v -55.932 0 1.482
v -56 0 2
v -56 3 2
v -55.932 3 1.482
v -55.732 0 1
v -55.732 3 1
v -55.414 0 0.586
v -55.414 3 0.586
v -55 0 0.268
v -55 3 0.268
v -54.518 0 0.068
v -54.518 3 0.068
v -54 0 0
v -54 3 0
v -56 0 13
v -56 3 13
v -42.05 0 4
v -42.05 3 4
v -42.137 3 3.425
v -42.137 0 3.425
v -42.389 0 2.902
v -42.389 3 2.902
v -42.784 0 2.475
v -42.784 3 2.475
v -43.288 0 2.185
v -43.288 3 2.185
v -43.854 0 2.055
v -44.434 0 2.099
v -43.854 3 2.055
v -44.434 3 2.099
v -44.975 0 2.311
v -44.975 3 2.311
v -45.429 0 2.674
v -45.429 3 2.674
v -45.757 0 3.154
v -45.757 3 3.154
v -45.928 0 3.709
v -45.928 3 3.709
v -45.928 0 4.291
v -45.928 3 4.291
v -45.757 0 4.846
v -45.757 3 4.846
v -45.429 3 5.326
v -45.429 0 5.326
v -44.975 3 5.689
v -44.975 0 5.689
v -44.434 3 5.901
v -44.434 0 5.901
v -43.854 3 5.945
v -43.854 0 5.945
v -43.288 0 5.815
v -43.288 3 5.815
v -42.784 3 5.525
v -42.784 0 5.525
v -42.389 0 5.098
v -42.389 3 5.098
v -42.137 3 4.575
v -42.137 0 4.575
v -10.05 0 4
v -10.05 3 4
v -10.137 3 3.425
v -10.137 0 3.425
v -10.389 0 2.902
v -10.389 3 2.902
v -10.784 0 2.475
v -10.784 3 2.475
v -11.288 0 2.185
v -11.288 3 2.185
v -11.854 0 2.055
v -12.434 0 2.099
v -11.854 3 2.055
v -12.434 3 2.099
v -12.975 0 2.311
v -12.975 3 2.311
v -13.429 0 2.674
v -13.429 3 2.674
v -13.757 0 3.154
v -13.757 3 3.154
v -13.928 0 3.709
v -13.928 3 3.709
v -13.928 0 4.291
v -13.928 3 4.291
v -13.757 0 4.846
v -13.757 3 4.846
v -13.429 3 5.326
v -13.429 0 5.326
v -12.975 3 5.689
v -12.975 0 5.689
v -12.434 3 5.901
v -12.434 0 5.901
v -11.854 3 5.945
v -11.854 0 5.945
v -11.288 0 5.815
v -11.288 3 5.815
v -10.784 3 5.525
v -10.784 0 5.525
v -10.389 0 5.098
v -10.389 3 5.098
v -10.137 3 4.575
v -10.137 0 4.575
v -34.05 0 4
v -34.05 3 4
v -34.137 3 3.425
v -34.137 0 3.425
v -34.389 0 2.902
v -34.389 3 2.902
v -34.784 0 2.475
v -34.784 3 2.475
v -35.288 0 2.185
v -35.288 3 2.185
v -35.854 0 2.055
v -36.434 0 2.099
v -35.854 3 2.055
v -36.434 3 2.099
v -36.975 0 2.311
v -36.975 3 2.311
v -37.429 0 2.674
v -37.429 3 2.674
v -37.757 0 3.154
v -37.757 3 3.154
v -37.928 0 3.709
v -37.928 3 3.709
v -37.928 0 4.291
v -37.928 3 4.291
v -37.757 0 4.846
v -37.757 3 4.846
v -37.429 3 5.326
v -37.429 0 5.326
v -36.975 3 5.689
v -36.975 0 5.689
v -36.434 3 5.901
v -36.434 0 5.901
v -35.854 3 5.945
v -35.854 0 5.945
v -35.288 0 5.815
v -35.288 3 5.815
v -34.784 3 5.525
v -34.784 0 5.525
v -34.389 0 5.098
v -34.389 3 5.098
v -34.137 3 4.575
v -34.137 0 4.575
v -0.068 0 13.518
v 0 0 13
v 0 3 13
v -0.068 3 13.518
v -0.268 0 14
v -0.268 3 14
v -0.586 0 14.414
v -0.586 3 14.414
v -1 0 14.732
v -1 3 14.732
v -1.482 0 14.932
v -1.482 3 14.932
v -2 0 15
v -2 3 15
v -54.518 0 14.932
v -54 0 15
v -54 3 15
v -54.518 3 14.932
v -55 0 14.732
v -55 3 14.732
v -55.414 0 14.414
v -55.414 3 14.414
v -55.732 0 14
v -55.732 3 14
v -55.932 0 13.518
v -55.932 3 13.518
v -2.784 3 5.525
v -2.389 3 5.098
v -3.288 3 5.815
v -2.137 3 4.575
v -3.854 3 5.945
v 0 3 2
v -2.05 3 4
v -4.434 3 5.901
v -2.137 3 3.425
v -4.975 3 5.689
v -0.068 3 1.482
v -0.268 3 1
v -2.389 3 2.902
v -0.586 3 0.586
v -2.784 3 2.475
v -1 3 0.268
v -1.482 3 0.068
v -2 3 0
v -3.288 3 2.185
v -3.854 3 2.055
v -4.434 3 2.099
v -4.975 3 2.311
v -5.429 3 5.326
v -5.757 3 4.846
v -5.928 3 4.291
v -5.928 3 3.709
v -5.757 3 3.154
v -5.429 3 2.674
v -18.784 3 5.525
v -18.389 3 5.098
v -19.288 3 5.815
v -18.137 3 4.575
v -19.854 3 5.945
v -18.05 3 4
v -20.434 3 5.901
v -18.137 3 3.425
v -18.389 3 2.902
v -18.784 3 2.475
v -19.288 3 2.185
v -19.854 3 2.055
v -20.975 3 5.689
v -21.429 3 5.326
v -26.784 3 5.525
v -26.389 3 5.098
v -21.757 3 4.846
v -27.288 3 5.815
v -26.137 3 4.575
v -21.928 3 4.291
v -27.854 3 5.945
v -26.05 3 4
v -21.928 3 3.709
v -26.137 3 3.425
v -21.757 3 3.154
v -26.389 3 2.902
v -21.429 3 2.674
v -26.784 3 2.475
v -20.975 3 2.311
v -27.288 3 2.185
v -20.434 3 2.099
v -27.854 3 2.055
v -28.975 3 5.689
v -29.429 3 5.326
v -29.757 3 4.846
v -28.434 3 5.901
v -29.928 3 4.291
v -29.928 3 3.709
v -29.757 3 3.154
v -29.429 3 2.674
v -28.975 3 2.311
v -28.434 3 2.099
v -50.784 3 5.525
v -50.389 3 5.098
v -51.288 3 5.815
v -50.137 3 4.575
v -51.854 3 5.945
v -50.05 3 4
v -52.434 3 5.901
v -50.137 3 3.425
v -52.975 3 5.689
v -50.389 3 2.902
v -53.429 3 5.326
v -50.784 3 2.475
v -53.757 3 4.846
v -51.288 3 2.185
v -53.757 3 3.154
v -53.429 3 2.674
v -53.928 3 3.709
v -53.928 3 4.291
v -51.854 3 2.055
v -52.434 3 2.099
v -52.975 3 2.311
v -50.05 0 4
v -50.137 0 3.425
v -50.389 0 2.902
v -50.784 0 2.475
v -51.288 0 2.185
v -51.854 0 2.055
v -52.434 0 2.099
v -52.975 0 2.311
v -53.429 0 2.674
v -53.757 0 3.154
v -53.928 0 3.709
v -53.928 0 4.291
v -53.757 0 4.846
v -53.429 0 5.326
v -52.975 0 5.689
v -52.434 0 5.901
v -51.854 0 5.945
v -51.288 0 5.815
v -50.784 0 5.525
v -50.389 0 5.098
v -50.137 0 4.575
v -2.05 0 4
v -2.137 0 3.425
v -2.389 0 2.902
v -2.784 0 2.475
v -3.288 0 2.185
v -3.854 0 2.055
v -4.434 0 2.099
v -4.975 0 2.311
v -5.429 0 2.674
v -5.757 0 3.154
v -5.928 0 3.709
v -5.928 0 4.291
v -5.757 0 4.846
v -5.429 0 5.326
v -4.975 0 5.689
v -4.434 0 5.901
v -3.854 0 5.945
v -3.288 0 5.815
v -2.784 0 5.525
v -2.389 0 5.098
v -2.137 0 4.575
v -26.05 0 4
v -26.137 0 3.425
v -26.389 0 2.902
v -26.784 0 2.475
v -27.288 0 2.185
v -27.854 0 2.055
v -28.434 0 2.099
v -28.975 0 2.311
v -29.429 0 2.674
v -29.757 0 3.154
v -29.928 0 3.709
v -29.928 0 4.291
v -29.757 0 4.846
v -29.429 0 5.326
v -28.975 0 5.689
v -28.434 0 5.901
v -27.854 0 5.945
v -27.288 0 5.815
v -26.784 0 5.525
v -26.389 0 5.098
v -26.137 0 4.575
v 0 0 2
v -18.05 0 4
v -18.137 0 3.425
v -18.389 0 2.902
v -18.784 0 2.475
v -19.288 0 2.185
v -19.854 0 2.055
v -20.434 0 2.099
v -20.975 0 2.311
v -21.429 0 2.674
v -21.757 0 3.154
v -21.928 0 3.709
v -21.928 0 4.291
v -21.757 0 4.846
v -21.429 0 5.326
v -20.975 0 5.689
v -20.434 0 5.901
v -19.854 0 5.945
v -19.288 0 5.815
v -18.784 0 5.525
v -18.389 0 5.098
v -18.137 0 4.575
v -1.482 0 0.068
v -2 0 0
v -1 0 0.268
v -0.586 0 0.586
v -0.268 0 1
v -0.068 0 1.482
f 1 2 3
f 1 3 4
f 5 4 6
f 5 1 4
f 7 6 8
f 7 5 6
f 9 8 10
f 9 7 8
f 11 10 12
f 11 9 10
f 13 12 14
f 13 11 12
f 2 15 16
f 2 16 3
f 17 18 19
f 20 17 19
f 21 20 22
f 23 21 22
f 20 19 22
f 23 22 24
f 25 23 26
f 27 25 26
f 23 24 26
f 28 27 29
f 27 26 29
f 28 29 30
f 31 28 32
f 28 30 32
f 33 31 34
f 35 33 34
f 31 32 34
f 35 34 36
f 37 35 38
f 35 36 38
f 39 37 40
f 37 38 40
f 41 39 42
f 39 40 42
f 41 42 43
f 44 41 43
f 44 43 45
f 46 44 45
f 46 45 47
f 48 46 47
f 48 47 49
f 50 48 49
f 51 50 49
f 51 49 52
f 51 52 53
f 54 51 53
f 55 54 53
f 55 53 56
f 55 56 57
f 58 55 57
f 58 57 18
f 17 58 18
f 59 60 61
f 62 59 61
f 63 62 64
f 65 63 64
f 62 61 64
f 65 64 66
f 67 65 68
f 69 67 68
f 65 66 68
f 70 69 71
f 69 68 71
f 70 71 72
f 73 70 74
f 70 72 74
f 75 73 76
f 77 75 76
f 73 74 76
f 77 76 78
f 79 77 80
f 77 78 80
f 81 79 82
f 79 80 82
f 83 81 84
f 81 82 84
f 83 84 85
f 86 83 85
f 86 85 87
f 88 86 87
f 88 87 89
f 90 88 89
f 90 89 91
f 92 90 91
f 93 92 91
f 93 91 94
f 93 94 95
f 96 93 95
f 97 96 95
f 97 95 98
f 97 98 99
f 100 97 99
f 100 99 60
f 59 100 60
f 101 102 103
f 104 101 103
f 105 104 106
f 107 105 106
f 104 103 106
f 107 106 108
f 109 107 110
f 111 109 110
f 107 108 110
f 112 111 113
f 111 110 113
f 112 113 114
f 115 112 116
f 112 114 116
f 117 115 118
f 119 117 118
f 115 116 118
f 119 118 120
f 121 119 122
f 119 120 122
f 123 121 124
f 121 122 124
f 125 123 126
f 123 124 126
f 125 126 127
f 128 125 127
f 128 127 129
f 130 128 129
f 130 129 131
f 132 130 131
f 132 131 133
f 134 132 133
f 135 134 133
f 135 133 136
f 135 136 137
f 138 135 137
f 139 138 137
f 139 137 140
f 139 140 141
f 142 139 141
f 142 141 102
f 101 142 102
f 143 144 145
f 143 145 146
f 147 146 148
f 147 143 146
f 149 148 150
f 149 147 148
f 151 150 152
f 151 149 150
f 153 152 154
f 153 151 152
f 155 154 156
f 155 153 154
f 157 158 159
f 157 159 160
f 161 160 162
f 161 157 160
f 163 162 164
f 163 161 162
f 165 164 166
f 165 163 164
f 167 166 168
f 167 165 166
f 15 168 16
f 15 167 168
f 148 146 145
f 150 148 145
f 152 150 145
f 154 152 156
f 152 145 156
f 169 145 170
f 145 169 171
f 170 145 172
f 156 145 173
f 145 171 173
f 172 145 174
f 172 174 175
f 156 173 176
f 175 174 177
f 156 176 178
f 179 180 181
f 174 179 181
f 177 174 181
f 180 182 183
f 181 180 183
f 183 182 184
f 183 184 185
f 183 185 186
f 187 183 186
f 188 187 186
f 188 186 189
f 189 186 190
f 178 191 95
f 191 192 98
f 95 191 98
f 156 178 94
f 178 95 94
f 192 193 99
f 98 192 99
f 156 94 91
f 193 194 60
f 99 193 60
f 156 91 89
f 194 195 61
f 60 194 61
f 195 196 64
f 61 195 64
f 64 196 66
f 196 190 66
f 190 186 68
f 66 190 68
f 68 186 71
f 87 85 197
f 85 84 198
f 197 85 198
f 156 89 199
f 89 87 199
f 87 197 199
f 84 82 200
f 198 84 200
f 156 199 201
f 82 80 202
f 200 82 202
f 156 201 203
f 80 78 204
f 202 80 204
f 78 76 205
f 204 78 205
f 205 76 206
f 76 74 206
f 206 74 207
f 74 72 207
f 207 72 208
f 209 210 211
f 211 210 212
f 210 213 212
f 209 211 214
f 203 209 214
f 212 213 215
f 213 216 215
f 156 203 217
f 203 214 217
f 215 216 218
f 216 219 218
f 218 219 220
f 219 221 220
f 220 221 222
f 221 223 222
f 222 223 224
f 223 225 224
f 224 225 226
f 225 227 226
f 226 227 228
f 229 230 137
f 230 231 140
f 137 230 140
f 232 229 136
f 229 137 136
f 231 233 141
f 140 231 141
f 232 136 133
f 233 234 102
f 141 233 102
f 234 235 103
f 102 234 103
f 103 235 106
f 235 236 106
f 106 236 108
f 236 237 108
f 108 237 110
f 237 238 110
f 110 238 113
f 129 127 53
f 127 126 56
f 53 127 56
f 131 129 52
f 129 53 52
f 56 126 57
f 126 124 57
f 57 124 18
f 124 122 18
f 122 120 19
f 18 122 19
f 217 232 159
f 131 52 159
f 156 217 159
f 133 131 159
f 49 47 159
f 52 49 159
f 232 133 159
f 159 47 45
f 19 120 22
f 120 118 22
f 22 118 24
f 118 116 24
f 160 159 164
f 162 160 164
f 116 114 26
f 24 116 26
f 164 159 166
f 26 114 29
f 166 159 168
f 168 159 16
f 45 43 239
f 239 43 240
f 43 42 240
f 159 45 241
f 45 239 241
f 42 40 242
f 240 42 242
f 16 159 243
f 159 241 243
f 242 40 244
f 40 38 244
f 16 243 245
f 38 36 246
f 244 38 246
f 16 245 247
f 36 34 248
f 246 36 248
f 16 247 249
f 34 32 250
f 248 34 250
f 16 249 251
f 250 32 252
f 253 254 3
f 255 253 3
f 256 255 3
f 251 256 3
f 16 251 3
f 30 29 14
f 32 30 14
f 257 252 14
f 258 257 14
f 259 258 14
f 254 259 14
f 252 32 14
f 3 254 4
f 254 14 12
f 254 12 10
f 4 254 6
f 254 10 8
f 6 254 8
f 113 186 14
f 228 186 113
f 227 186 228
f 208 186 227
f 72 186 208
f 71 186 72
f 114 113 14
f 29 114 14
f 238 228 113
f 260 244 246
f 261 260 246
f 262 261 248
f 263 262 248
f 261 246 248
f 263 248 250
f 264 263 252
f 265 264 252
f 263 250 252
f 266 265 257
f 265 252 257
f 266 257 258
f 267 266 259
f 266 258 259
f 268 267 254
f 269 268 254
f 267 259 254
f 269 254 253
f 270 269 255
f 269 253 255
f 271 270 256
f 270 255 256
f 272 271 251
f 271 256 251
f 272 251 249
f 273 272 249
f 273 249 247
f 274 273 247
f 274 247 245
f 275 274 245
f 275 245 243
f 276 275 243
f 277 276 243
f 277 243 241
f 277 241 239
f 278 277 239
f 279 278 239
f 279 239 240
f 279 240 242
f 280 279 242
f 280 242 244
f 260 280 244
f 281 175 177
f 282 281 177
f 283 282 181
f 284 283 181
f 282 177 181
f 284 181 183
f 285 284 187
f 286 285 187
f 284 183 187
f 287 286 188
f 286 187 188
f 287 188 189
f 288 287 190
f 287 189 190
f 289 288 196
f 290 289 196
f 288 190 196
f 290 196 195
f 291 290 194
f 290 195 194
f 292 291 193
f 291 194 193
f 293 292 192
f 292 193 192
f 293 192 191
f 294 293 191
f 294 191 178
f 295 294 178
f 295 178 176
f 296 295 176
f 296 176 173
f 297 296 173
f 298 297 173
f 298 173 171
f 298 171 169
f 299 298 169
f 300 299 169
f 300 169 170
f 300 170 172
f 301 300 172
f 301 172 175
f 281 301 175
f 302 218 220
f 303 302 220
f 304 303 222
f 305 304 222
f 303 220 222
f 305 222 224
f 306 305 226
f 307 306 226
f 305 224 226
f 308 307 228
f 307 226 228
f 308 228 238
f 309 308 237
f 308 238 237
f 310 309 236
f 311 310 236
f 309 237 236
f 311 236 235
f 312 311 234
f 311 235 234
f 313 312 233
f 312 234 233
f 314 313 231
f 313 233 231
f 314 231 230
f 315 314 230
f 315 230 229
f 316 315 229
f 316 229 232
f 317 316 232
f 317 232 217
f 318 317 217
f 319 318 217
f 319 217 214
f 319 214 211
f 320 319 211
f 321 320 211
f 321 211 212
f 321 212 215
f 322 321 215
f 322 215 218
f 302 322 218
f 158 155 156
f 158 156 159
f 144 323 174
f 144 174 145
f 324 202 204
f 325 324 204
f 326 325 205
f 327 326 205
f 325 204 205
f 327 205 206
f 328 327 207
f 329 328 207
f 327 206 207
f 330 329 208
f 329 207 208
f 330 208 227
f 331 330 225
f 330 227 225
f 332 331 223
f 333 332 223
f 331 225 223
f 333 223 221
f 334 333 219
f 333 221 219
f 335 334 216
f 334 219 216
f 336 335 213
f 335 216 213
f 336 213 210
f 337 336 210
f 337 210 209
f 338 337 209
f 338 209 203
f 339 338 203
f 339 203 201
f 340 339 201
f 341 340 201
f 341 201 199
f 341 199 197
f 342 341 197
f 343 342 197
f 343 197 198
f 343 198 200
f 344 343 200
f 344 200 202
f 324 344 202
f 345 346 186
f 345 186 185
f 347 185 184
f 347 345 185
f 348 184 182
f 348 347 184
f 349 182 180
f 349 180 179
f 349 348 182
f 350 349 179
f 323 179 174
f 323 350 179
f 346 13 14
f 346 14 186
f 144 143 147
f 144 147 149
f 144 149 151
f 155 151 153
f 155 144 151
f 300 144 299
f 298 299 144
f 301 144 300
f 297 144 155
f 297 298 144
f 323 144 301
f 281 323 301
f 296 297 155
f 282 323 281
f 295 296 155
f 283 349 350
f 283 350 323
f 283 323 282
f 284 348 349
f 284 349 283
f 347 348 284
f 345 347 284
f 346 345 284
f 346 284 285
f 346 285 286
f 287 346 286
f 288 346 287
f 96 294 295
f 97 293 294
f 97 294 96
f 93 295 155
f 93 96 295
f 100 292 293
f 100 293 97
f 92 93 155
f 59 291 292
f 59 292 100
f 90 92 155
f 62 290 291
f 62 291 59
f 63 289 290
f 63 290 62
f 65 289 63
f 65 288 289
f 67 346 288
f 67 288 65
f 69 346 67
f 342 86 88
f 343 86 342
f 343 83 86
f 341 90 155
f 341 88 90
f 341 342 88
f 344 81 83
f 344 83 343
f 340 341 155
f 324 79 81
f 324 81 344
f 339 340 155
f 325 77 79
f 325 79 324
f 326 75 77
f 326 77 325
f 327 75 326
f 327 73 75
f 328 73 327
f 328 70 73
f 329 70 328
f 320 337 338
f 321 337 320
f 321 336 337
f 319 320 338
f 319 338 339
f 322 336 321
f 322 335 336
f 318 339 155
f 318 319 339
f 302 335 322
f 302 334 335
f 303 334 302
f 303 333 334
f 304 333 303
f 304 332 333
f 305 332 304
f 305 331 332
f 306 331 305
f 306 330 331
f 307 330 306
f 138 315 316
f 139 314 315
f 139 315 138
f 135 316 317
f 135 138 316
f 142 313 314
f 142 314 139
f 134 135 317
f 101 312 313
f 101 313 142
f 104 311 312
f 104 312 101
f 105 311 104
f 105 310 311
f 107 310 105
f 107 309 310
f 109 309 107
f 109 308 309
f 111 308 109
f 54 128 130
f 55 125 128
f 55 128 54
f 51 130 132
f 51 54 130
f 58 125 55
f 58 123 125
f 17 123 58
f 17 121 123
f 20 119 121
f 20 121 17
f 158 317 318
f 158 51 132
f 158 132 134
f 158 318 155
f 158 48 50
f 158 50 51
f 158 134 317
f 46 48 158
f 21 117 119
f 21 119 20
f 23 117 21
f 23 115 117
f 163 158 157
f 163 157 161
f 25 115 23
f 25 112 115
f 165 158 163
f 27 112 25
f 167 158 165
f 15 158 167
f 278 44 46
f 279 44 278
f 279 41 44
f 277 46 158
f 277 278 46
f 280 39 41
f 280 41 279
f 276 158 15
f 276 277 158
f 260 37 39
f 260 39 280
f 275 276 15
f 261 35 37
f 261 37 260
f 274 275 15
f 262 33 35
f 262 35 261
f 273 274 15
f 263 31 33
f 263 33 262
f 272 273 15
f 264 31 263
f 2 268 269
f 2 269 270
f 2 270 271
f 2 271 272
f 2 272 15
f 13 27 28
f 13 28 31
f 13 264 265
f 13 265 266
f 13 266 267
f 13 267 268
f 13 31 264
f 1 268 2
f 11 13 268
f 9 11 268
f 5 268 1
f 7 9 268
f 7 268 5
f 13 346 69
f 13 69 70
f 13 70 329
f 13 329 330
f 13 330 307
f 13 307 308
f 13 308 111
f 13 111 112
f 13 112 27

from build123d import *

# Parameters (mm, degrees)
BOSS_EXTRUDE1_DEPTH = 3
SKETCH2_R           = 1.95
CUT_EXTRUDE1_DEPTH  = 4


with BuildPart() as part:
    # Sketch1 → Boss-Extrude1 (new body)
    with BuildSketch(Plane(origin=(0, 0, 0), x_dir=(1, 0, 0), z_dir=(0, 1, 0))):
        with BuildLine():
            Line((-54, 0), (-2, 0))
            ThreePointArc((-2, 0), (-0.585786438, -0.585786438), (0, -2))
            Line((0, -2), (0, -13))
            ThreePointArc((0, -13), (-0.585786438, -14.414213562), (-2, -15))
            Line((-2, -15), (-54, -15))
            ThreePointArc((-54, -15), (-55.414213562, -14.414213562), (-56, -13))
            Line((-56, -13), (-56, -2))
            ThreePointArc((-56, -2), (-55.414213562, -0.585786438), (-54, 0))
        make_face()
    extrude(amount=BOSS_EXTRUDE1_DEPTH)

    # Sketch2 → Cut-Extrude1 (cut, through all)
    with BuildSketch(Plane(origin=(0, 3, 0), x_dir=(1, 0, 0), z_dir=(0, 1, 0))):
        with Locations((-4, -4)):
            Circle(SKETCH2_R)
        with Locations((-12, -4)):
            Circle(SKETCH2_R)
        with Locations((-76, -4)):
            Circle(SKETCH2_R)
        with Locations((-68, -4)):
            Circle(SKETCH2_R)
        with Locations((-60, -4)):
            Circle(SKETCH2_R)
        with Locations((-52, -4)):
            Circle(SKETCH2_R)
        with Locations((-44, -4)):
            Circle(SKETCH2_R)
        with Locations((-36, -4)):
            Circle(SKETCH2_R)
        with Locations((-28, -4)):
            Circle(SKETCH2_R)
        with Locations((-20, -4)):
            Circle(SKETCH2_R)
    extrude(amount=-CUT_EXTRUDE1_DEPTH, mode=Mode.SUBTRACT)


solid = part.part
